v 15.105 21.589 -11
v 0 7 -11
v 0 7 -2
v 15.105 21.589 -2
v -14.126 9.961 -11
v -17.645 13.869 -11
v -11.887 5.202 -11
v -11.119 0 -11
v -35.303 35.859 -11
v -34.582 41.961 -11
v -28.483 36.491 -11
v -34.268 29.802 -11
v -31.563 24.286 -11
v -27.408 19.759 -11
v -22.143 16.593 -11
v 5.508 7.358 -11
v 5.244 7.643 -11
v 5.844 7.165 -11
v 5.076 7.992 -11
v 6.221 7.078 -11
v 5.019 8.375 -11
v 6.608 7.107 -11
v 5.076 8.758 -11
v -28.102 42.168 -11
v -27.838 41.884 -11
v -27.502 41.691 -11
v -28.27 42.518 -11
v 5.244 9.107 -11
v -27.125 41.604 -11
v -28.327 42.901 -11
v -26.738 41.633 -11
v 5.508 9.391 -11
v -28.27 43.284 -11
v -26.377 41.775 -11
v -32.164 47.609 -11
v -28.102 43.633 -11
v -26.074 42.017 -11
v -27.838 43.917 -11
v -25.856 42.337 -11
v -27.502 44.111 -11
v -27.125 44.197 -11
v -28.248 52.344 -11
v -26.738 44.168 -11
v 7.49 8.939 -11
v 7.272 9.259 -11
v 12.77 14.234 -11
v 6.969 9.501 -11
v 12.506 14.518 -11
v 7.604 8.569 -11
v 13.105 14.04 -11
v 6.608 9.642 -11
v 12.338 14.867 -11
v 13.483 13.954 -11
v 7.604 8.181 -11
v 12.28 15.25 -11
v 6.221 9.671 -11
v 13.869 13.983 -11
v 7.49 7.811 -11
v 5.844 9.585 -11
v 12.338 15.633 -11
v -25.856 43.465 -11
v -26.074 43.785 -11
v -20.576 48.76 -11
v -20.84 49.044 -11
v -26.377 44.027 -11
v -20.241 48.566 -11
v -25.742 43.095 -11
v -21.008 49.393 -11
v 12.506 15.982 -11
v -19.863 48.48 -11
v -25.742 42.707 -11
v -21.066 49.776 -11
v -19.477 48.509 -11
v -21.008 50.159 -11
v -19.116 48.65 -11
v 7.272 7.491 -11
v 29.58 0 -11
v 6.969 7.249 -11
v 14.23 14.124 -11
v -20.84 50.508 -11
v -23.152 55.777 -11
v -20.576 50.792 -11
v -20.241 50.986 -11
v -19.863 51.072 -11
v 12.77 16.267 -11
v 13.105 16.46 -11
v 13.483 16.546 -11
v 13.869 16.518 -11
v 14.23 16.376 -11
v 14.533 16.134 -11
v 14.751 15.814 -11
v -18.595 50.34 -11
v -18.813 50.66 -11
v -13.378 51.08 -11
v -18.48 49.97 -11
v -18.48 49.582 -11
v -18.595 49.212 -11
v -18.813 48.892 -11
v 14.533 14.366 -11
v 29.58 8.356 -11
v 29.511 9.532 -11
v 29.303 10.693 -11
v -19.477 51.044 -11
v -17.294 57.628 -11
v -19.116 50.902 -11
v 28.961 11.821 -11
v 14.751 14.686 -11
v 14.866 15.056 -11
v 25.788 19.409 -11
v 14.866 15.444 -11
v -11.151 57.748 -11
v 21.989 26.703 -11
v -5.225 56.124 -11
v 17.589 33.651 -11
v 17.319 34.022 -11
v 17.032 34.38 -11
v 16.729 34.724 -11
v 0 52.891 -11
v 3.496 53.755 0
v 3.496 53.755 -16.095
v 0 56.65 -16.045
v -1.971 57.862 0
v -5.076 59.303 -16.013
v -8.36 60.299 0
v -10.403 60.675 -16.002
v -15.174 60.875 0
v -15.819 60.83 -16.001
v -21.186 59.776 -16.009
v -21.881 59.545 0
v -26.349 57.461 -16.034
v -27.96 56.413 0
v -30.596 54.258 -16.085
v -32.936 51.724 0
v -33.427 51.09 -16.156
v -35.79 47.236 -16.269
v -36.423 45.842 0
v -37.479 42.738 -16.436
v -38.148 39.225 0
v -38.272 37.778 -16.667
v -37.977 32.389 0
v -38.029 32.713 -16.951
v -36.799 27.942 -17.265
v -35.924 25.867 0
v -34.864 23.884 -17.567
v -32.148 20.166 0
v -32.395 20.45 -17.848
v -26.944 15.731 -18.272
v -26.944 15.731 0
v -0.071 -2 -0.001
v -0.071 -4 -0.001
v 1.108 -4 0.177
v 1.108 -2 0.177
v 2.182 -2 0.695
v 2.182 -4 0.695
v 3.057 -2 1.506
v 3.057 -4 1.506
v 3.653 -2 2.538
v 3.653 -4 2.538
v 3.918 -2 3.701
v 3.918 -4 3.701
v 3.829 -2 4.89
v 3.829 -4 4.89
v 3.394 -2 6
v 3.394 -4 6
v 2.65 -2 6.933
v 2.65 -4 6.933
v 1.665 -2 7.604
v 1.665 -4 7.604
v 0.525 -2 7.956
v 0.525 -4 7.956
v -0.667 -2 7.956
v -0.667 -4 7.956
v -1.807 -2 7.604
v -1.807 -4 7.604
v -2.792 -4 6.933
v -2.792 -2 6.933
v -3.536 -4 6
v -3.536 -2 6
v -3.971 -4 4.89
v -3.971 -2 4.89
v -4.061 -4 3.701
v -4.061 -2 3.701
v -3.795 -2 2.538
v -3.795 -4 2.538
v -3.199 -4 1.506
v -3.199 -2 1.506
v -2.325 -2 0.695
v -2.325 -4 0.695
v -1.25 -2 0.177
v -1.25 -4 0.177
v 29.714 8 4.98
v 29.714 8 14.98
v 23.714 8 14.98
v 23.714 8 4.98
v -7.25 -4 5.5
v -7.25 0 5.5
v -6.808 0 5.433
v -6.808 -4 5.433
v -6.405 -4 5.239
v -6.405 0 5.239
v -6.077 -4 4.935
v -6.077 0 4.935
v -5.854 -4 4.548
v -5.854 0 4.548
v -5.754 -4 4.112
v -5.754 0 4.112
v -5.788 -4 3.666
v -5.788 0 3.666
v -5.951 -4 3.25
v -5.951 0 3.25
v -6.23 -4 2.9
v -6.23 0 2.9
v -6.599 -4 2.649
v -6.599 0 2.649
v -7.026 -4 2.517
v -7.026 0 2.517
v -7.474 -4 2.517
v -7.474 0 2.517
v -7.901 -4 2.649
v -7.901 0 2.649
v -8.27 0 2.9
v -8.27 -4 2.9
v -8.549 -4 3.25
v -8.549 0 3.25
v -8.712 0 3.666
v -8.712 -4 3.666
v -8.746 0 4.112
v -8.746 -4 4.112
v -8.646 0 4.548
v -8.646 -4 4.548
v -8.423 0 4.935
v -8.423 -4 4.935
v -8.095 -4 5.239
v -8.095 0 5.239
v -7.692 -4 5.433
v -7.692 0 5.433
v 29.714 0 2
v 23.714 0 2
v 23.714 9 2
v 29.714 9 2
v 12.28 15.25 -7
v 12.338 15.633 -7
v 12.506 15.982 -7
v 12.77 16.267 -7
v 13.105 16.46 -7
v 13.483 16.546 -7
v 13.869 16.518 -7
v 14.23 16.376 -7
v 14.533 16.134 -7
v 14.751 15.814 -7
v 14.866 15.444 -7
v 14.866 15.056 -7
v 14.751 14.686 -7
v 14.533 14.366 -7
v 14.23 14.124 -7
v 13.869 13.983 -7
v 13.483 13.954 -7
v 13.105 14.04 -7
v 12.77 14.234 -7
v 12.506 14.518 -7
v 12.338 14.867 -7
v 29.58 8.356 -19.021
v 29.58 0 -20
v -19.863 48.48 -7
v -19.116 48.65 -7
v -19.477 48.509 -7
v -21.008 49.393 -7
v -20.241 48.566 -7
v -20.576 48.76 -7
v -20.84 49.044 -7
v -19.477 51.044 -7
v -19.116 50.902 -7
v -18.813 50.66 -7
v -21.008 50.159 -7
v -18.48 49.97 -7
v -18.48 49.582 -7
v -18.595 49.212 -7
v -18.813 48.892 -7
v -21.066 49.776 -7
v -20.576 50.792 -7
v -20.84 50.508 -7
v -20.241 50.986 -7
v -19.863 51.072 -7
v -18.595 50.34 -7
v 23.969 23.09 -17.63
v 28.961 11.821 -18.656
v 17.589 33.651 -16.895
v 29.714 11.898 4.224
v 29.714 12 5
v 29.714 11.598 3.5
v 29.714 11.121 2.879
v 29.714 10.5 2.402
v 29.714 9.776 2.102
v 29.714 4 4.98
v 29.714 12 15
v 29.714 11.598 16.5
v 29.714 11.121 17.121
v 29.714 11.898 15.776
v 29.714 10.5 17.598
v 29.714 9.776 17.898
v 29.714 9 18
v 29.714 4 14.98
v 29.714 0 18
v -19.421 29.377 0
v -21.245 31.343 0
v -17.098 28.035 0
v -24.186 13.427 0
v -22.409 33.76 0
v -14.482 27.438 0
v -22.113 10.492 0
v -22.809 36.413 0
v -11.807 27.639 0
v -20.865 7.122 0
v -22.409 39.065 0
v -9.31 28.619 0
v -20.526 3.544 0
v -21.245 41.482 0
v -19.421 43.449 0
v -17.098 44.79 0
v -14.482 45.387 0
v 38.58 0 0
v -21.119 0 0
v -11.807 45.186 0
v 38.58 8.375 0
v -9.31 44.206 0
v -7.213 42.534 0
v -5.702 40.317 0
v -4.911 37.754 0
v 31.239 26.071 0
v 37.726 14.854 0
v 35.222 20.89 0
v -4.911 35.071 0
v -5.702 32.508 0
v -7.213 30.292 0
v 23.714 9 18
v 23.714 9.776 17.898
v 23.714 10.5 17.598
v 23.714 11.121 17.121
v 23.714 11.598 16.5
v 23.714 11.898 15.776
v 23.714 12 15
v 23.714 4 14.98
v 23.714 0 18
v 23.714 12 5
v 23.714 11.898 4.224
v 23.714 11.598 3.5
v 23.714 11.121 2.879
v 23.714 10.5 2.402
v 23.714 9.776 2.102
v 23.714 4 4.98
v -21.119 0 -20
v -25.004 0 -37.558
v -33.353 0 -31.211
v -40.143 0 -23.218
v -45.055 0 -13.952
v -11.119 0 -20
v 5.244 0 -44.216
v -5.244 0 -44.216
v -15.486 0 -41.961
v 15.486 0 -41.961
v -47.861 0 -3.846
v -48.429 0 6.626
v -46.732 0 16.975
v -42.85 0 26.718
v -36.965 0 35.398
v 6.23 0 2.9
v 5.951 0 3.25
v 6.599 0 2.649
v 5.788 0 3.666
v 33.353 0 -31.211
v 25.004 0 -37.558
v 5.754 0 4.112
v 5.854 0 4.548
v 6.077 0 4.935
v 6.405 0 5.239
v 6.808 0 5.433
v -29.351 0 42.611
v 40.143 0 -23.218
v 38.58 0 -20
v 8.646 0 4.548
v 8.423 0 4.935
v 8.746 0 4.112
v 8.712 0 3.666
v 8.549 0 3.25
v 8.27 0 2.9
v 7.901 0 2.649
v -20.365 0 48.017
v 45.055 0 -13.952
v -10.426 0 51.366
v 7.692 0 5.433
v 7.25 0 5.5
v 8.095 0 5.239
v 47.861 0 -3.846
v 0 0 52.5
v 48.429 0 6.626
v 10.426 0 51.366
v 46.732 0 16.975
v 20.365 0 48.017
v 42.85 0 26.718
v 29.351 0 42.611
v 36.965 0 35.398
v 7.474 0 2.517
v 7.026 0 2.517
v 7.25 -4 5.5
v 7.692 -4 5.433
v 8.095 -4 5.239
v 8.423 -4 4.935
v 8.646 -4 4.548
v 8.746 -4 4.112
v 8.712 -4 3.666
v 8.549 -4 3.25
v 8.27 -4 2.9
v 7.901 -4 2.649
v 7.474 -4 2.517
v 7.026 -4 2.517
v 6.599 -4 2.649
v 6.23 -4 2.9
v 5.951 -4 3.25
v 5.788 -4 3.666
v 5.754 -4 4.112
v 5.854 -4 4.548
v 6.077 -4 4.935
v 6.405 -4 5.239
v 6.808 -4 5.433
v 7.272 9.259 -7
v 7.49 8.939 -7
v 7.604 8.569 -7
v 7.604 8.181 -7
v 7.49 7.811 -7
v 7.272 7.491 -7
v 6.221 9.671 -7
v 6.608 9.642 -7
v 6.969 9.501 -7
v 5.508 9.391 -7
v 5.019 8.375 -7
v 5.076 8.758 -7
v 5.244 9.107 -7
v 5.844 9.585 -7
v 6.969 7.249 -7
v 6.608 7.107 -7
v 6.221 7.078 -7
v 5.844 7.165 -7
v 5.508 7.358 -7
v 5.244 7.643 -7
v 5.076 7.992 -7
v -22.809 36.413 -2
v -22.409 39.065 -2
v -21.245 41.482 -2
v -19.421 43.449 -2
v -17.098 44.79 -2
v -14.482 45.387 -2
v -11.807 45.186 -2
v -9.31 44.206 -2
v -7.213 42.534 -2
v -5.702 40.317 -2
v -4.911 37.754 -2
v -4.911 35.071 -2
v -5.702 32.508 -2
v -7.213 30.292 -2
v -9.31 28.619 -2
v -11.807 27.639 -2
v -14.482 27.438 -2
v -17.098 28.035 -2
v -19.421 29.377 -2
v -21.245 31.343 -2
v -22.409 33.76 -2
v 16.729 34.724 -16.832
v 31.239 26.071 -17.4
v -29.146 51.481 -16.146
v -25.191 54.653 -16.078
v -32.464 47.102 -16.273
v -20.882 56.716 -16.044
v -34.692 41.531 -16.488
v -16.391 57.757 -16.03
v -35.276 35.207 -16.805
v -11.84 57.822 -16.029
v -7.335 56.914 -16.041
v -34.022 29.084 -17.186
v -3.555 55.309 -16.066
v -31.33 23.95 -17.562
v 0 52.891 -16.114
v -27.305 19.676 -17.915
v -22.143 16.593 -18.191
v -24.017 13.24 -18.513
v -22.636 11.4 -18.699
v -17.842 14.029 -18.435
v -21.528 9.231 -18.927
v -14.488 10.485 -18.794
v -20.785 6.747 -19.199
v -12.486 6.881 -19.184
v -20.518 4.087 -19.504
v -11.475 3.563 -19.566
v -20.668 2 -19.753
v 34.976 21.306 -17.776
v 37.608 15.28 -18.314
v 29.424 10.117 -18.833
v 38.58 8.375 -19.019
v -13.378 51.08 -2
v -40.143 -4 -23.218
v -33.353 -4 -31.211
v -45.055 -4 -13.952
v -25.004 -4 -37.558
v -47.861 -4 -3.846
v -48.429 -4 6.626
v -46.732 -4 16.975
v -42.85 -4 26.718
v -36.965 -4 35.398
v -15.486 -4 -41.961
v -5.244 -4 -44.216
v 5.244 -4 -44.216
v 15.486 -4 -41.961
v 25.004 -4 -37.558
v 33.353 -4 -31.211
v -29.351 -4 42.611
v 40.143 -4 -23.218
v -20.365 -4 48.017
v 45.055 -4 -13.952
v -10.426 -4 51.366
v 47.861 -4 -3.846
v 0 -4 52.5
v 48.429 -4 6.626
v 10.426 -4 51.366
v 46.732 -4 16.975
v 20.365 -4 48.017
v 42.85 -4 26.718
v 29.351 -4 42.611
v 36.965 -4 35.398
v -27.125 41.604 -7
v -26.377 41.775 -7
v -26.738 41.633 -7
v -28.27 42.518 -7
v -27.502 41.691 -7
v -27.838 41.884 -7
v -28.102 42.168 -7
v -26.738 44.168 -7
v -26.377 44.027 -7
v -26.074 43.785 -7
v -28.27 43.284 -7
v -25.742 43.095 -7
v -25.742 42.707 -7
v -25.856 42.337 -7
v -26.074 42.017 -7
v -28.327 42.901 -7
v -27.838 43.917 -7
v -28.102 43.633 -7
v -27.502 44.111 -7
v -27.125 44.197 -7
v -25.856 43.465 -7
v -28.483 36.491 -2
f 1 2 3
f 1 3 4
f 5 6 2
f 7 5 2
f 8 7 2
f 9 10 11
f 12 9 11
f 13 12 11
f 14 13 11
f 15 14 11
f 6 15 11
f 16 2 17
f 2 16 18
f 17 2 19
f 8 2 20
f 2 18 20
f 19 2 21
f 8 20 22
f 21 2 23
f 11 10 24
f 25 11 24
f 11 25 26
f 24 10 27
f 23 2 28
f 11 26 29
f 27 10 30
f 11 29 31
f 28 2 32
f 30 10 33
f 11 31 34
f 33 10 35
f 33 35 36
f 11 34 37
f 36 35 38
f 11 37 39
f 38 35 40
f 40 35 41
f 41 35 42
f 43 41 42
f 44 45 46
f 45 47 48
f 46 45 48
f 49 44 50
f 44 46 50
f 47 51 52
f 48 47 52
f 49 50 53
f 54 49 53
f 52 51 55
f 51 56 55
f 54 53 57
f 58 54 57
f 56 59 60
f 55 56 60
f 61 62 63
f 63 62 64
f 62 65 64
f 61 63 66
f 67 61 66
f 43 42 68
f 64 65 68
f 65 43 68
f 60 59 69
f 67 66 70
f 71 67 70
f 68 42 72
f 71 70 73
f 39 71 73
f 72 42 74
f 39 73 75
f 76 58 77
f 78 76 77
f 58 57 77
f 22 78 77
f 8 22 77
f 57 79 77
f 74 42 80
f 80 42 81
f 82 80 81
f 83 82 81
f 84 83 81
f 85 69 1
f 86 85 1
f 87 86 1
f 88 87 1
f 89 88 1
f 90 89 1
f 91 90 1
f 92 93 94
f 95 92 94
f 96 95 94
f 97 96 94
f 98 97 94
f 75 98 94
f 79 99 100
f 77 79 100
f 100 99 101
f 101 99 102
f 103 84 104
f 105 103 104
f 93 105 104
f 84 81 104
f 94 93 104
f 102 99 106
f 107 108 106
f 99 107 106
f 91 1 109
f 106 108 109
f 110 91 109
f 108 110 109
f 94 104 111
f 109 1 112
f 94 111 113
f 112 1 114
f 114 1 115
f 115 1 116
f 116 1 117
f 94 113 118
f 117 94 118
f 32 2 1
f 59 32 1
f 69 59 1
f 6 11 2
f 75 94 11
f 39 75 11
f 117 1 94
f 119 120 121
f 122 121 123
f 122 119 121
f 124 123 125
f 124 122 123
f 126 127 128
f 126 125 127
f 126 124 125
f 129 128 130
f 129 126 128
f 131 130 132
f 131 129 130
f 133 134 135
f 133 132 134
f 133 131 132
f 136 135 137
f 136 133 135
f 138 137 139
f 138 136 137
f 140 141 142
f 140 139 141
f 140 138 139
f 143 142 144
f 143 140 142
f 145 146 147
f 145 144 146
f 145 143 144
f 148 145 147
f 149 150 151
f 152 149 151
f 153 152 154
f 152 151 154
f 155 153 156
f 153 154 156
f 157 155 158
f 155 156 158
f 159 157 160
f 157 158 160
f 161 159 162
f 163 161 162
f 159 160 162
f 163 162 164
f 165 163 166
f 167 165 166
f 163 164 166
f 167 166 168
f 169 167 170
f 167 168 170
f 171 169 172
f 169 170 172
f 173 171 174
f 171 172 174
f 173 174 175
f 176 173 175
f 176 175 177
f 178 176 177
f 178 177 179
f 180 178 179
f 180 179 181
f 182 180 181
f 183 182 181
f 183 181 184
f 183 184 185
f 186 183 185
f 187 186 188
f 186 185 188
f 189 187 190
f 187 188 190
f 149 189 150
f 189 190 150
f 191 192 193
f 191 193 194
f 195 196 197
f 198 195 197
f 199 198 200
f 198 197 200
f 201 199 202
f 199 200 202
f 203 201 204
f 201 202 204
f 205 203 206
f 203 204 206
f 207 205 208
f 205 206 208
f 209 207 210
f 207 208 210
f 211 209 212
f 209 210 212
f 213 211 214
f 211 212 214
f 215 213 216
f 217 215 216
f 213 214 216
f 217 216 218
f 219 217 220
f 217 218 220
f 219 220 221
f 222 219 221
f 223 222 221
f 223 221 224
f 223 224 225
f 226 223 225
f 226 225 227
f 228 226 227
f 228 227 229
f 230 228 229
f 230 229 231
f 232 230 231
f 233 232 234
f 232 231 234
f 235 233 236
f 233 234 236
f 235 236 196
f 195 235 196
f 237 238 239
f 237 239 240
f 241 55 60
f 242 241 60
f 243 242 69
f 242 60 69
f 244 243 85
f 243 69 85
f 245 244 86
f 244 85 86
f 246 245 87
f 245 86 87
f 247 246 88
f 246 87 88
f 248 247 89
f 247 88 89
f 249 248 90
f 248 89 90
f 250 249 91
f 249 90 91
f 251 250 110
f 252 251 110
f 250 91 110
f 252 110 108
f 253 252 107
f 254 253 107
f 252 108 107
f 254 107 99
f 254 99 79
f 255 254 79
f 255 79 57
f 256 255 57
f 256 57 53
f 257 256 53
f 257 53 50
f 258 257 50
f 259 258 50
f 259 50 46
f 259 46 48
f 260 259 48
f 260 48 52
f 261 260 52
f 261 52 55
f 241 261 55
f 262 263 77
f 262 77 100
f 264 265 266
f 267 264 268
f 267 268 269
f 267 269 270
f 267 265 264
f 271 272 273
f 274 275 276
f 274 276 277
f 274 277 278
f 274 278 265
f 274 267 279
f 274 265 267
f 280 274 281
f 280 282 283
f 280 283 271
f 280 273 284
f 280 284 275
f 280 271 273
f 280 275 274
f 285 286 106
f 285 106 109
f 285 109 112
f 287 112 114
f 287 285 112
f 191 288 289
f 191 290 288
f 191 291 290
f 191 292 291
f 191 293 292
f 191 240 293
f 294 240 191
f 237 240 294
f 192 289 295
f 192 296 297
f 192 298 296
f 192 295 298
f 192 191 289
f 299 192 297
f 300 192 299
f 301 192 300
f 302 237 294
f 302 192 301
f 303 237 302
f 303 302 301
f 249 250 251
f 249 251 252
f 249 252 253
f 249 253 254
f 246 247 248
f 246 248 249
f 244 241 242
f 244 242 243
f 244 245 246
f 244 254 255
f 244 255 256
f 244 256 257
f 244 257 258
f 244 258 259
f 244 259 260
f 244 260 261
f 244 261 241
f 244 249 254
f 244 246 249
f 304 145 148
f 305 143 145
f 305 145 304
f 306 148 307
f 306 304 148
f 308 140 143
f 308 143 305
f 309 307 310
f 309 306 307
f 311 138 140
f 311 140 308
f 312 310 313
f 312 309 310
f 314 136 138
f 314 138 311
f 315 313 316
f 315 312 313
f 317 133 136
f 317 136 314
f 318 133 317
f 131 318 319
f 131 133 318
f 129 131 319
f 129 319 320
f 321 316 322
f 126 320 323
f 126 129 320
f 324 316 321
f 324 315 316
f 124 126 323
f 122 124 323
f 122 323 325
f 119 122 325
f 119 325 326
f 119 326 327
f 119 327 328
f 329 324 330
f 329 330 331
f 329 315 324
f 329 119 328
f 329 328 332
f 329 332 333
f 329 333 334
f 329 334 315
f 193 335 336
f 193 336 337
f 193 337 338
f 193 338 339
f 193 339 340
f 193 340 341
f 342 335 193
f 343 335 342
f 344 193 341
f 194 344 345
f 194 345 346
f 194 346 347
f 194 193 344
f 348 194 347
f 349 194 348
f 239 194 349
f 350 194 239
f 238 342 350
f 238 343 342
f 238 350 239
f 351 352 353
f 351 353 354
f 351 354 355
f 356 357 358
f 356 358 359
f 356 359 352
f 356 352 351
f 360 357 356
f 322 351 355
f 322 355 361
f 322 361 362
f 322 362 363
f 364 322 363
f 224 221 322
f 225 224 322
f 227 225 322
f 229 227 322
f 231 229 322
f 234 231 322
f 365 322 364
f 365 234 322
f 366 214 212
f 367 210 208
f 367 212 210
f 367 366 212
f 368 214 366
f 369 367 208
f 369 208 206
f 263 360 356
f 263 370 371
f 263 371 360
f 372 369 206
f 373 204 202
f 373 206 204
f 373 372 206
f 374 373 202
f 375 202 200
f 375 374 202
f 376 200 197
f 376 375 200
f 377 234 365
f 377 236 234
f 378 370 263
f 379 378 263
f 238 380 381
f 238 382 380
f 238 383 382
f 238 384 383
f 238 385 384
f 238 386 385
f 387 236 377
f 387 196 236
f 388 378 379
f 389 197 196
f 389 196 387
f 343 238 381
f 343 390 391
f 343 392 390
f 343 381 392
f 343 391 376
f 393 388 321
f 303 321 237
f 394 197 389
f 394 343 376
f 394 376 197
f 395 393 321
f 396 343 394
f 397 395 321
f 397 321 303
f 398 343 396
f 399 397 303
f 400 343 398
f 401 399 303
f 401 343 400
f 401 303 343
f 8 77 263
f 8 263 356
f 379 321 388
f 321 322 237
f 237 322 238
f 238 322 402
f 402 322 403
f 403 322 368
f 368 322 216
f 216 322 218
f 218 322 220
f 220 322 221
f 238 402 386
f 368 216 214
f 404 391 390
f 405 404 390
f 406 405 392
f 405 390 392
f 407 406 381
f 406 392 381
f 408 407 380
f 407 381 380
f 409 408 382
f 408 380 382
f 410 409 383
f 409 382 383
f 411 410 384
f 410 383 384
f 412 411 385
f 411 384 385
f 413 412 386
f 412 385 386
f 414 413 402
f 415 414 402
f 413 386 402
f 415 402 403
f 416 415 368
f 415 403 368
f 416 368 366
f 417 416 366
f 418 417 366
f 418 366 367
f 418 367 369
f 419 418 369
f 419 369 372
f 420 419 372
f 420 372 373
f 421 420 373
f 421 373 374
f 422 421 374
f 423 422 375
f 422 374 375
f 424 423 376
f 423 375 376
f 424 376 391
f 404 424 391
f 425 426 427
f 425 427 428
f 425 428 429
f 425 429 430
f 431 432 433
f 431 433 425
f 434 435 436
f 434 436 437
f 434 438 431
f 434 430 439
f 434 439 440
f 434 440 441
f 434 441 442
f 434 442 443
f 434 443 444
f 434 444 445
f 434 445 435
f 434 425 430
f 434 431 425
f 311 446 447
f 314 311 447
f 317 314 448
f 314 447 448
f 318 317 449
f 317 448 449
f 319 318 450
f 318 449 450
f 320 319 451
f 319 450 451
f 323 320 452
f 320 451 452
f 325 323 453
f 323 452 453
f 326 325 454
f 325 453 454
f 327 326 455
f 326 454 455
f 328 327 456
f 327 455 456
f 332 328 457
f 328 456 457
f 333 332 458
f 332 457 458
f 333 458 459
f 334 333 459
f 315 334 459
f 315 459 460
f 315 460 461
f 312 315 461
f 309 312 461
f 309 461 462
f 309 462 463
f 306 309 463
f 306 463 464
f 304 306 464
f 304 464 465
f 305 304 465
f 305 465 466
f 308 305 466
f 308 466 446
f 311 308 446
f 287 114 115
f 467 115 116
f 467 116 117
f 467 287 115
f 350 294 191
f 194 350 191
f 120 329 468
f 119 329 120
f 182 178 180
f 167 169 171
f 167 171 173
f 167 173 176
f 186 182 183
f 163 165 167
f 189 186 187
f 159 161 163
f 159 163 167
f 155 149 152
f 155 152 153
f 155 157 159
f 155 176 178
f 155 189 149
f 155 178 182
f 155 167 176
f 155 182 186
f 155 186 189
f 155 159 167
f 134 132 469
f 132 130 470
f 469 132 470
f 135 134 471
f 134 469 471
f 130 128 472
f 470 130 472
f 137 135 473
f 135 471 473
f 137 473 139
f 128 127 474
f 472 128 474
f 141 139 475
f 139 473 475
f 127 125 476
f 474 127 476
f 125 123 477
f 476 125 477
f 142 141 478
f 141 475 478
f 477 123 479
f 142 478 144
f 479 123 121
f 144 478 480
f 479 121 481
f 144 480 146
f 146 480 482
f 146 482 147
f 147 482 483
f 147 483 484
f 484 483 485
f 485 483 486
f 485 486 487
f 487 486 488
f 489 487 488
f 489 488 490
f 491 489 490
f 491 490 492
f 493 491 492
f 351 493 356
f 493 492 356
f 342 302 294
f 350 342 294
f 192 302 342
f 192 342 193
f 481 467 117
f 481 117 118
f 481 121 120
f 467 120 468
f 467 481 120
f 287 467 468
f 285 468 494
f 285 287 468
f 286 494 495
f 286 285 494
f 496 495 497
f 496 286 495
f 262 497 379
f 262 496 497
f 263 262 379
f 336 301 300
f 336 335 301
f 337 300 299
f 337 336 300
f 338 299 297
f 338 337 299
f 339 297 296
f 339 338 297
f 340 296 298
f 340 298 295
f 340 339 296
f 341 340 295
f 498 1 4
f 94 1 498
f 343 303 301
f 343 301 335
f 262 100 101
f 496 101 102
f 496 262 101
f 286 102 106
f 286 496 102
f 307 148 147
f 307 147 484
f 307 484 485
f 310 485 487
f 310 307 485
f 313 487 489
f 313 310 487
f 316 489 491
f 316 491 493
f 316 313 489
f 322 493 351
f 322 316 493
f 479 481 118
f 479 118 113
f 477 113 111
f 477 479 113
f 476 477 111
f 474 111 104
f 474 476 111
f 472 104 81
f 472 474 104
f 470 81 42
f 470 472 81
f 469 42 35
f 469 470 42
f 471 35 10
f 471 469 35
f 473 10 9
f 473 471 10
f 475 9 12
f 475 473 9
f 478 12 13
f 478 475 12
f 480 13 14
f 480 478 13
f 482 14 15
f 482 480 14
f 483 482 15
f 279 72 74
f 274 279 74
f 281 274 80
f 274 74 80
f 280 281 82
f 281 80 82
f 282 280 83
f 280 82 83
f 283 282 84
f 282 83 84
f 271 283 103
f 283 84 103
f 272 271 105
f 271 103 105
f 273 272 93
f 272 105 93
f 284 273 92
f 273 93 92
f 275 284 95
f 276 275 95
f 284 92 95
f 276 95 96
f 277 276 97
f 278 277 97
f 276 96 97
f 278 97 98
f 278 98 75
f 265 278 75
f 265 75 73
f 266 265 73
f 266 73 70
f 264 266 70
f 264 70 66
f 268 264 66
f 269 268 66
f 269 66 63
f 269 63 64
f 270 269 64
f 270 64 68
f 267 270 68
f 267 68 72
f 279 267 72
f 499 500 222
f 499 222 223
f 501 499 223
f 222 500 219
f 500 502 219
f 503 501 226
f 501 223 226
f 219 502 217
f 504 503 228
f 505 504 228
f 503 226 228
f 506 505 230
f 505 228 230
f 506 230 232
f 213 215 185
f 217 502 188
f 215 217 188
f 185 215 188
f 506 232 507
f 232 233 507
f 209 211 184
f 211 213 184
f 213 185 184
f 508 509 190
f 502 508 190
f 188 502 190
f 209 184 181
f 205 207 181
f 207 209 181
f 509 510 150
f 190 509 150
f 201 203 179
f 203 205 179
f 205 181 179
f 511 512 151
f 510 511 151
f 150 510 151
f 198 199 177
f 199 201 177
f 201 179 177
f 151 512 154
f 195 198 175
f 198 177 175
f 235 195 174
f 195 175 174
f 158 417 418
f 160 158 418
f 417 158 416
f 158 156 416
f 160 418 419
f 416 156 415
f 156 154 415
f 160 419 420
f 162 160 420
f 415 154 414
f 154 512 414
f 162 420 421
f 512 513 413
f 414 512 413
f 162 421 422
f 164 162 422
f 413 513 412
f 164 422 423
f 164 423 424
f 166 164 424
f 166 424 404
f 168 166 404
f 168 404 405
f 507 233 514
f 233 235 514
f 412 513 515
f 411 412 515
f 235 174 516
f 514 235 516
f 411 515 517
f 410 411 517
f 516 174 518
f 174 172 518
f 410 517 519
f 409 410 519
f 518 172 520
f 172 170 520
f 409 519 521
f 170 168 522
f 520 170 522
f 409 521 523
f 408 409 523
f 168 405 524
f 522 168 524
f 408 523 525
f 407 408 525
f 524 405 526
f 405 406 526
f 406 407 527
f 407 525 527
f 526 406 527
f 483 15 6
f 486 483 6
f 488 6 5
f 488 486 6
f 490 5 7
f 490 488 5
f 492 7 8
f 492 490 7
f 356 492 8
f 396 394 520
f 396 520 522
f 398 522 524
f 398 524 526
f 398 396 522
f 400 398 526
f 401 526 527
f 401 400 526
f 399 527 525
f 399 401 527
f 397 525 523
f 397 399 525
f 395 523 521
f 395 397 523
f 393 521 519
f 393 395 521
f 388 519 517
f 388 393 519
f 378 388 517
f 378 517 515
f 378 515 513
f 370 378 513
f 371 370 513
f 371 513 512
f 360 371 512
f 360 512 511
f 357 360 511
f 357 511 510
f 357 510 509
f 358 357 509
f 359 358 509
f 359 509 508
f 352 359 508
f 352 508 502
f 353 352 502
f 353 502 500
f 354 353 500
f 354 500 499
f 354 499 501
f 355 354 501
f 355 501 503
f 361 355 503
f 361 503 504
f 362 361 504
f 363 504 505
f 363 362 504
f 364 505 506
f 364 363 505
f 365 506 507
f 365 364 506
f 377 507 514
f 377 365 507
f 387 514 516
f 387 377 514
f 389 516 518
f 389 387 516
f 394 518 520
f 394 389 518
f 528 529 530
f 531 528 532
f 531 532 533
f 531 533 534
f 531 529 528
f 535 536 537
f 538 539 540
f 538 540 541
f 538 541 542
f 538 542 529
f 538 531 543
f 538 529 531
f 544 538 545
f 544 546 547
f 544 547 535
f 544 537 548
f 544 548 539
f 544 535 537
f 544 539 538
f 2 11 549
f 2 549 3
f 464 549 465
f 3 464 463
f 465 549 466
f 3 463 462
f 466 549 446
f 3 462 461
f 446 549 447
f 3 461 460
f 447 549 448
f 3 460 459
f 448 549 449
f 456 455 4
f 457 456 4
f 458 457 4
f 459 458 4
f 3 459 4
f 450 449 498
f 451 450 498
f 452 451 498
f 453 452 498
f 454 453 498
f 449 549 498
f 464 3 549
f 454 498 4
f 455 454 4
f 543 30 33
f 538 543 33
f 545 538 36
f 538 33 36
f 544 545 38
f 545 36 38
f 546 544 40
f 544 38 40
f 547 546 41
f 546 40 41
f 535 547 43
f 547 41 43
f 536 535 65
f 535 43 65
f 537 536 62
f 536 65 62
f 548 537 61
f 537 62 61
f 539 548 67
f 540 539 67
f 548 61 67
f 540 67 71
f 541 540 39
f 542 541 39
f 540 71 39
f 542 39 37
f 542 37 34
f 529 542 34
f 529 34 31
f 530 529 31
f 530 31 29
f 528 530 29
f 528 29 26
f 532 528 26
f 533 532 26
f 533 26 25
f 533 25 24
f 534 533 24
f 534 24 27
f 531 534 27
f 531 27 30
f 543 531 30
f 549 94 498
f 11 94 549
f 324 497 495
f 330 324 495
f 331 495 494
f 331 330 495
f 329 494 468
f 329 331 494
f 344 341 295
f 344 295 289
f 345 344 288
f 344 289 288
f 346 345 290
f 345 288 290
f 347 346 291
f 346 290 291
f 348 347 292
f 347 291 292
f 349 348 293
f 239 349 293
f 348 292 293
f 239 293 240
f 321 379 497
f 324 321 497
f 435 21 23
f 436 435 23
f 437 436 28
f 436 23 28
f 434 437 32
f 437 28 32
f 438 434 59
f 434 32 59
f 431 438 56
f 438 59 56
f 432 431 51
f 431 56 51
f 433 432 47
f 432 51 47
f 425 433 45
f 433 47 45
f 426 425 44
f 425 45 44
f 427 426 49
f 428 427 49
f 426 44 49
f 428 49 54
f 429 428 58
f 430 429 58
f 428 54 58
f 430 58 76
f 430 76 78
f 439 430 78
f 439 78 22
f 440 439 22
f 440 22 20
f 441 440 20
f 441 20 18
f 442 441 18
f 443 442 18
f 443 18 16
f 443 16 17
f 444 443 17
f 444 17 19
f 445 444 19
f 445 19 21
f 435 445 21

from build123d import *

# Parameters (mm, degrees)
IZIM2_R                     = 48.5
IZIM2_R_2                   = 1.5
Y_KSEKLIK_EKSTR_ZYON1_DEPTH = 4
Y_KSEKLIK_EKSTR_ZYON2_DEPTH = 20
KES_EKSTR_ZYON2_DEPTH       = 9
KES_EKSTR_ZYON4_DEPTH       = 18
IZIM8_R                     = 8.999373408
KES_EKSTR_ZYON6_DEPTH       = 20
IZIM10_R                    = 1.3
KES_EKSTR_ZYON7_DEPTH       = 13
Y_KSEKLIK_EKSTR_ZYON3_DEPTH = 12
RADYUS1_R                   = 3
RADYUS2_R                   = 3
IZIM11_W                    = 10
IZIM11_H                    = 4
KES_EKSTR_ZYON8_DEPTH       = 6
IZIM12_R                    = 4.00063253
KES_EKSTR_ZYON9_DEPTH       = 2
KES_EKSTR_ZYON10_DEPTH      = 40
KES_EKSTR_ZYON10_DEPTH_BACK = 40


with BuildPart() as part:
    # Çizim2 → Yükseklik-Ekstrüzyon1 (new body)
    with BuildSketch(Plane(origin=(0, 0, 0), x_dir=(1, 0, 0), z_dir=(0, 1, 0))):
        with Locations(Location((0, -4, 0), (0, 0, 270))):
            Circle(IZIM2_R)
        with Locations(Location((7.25, -4, 0), (0, 0, 270))):
            Circle(IZIM2_R_2, mode=Mode.SUBTRACT)
        with Locations(Location((-7.25, -4, 0), (0, 0, 270))):
            Circle(IZIM2_R_2, mode=Mode.SUBTRACT)
    extrude(amount=-Y_KSEKLIK_EKSTR_ZYON1_DEPTH)

    # Çizim3 → Yükseklik-Ekstrüzyon2 (add)
    with BuildSketch(Plane.XY):
        with BuildLine():
            Line((31.238930549, 26.071347433), (3.495879159, 53.755241116))
            ThreePointArc((3.495879159, 53.755241116), (-32.936073069, 51.72385839), (-26.943926702, 15.730694583))
            ThreePointArc((-26.943926702, 15.730694583), (-21.379626349, 8.847295043), (-21.118861947, 0))
            Line((-21.118861947, 0), (-8.860527496, 0))
            Line((-8.860527496, 0), (38.580138623, 0))
            Line((38.580138623, 0), (38.580138623, 8.374820438))
            ThreePointArc((38.580138623, 8.374820438), (36.672018128, 17.954230697), (31.238930549, 26.071347433))
        make_face()
    extrude(amount=-Y_KSEKLIK_EKSTR_ZYON2_DEPTH)

    # Çizim5 → Kes-Ekstrüzyon2 (cut)
    with BuildSketch(Plane(origin=(0, 0, -20), x_dir=(-1, 0, 0), z_dir=(0, 0, -1))):
        with BuildLine():
            Line((-29.580138623, 0), (-29.580138623, 8.355768388))
            ThreePointArc((-29.580138623, 8.355768388), (-29.424047841, 10.115726146), (-28.960648361, 11.820741267))
            ThreePointArc((-28.960648361, 11.820741267), (-23.965436041, 23.095860189), (-17.588526551, 33.651213249))
            ThreePointArc((-17.588526551, 33.651213249), (-17.177321901, 34.202292772), (-16.7292201, 34.72381236))
            Line((-16.7292201, 34.72381236), (0, 52.891150841))
            ThreePointArc((0, 52.891150841), (32.164197471, 47.609241385), (22.142551812, 16.593103896))
            ThreePointArc((22.142551812, 16.593103896), (14.125970591, 9.960582753), (11.118861947, 0))
            Line((11.118861947, 0), (-29.580138623, 0))
        make_face()
    extrude(amount=-KES_EKSTR_ZYON2_DEPTH, mode=Mode.SUBTRACT)

    # Çizim7 → Kes-Ekstrüzyon4 (cut)
    with BuildSketch(Plane(origin=(0, 0, -20), x_dir=(-1, 0, 0), z_dir=(0, 0, -1))):
        Polygon((28.483058649, 36.490937082), (0, 7), (-15.105114115, 21.588883698), (13.377944534, 51.079820781), align=None)
    extrude(amount=-KES_EKSTR_ZYON4_DEPTH, mode=Mode.SUBTRACT)

    # Çizim8 → Kes-Ekstrüzyon6 (cut)
    with BuildSketch(Plane(origin=(0, 0, -20), x_dir=(-1, 0, 0), z_dir=(0, 0, -1))):
        with Locations((13.809736929, 36.412644661)):
            Circle(IZIM8_R)
    extrude(amount=-KES_EKSTR_ZYON6_DEPTH, mode=Mode.SUBTRACT)

    # Çizim10 → Kes-Ekstrüzyon7 (cut)
    with BuildSketch(Plane(origin=(0, 0, -20), x_dir=(-1, 0, 0), z_dir=(0, 0, -1))):
        with Locations((-13.580138623, 15.2501239)):
            Circle(IZIM10_R)
        with Locations((-6.318582157, 8.374820438)):
            Circle(IZIM10_R)
        with Locations((19.765881259, 49.77609902)):
            Circle(IZIM10_R)
        with Locations((27.027437725, 42.900795558)):
            Circle(IZIM10_R)
    extrude(amount=-KES_EKSTR_ZYON7_DEPTH, mode=Mode.SUBTRACT)

    # 3B Çizim1 → Yükseklik-Ekstrüzyon3 (add)
    with BuildSketch(Plane(origin=(29.714278279, 0, 2), x_dir=(-0.35112344158839165, 0, 0.9363291775690447), z_dir=(0, 1, 0))):
        Polygon((0, 0), (14.981266841, 5.617975065), (17.088007491, 0), (2.10674065, -5.617975065), align=None)
    extrude(amount=Y_KSEKLIK_EKSTR_ZYON3_DEPTH)

    # Radyus1
    radyus1_edges = [part.edges().sort_by_distance(p)[0] for p in [
        (26.714278279, 12, 18),
    ]]
    fillet(radyus1_edges, radius=RADYUS1_R)

    # Radyus2
    radyus2_edges = [part.edges().sort_by_distance(p)[0] for p in [
        (26.714278279, 12, 2),
    ]]
    fillet(radyus2_edges, radius=RADYUS2_R)

    # Çizim11 → Kes-Ekstrüzyon8 (cut)
    with BuildSketch(Plane(origin=(29.714278279, 0, 0), x_dir=(0, 0, -1), z_dir=(1, 0, 0))):
        with Locations((-9.980022365, 6)):
            Rectangle(IZIM11_W, IZIM11_H)
    extrude(amount=-KES_EKSTR_ZYON8_DEPTH, mode=Mode.SUBTRACT)

    # Çizim12 → Kes-Ekstrüzyon9 (cut)
    with BuildSketch(Plane(origin=(0, -4, 0), x_dir=(-1, 0, 0), z_dir=(0, -1, 0))):
        with Locations(Location((0.071138185, -4, 0), (0, 0, 90))):
            Circle(IZIM12_R)
    extrude(amount=-KES_EKSTR_ZYON9_DEPTH, mode=Mode.SUBTRACT)

    # Çizim13 → Kes-Ekstrüzyon10 (cut, two sides)
    with BuildSketch(Plane(origin=(0, 0, 0), x_dir=(0, 0, -1), z_dir=(1, 0, 0))) as kes_ekstr_zyon10_sk:
        with BuildLine():
            Line((16, 60.912644661), (25.8774704, 60.912644661))
            Line((25.8774704, 60.912644661), (25.8774704, 0))
            Line((25.8774704, 0), (20, 0))
            add(Edge.make_bspline(
                [(16, 60.912644661), (16.195964828, 30.341679785), (20, 0)],
                knots=[0, 0, 0, 1, 1, 1], degree=2))
        make_face()
    extrude(amount=KES_EKSTR_ZYON10_DEPTH, mode=Mode.SUBTRACT)
    extrude(kes_ekstr_zyon10_sk.sketch, amount=-KES_EKSTR_ZYON10_DEPTH_BACK, mode=Mode.SUBTRACT)


solid = part.part
